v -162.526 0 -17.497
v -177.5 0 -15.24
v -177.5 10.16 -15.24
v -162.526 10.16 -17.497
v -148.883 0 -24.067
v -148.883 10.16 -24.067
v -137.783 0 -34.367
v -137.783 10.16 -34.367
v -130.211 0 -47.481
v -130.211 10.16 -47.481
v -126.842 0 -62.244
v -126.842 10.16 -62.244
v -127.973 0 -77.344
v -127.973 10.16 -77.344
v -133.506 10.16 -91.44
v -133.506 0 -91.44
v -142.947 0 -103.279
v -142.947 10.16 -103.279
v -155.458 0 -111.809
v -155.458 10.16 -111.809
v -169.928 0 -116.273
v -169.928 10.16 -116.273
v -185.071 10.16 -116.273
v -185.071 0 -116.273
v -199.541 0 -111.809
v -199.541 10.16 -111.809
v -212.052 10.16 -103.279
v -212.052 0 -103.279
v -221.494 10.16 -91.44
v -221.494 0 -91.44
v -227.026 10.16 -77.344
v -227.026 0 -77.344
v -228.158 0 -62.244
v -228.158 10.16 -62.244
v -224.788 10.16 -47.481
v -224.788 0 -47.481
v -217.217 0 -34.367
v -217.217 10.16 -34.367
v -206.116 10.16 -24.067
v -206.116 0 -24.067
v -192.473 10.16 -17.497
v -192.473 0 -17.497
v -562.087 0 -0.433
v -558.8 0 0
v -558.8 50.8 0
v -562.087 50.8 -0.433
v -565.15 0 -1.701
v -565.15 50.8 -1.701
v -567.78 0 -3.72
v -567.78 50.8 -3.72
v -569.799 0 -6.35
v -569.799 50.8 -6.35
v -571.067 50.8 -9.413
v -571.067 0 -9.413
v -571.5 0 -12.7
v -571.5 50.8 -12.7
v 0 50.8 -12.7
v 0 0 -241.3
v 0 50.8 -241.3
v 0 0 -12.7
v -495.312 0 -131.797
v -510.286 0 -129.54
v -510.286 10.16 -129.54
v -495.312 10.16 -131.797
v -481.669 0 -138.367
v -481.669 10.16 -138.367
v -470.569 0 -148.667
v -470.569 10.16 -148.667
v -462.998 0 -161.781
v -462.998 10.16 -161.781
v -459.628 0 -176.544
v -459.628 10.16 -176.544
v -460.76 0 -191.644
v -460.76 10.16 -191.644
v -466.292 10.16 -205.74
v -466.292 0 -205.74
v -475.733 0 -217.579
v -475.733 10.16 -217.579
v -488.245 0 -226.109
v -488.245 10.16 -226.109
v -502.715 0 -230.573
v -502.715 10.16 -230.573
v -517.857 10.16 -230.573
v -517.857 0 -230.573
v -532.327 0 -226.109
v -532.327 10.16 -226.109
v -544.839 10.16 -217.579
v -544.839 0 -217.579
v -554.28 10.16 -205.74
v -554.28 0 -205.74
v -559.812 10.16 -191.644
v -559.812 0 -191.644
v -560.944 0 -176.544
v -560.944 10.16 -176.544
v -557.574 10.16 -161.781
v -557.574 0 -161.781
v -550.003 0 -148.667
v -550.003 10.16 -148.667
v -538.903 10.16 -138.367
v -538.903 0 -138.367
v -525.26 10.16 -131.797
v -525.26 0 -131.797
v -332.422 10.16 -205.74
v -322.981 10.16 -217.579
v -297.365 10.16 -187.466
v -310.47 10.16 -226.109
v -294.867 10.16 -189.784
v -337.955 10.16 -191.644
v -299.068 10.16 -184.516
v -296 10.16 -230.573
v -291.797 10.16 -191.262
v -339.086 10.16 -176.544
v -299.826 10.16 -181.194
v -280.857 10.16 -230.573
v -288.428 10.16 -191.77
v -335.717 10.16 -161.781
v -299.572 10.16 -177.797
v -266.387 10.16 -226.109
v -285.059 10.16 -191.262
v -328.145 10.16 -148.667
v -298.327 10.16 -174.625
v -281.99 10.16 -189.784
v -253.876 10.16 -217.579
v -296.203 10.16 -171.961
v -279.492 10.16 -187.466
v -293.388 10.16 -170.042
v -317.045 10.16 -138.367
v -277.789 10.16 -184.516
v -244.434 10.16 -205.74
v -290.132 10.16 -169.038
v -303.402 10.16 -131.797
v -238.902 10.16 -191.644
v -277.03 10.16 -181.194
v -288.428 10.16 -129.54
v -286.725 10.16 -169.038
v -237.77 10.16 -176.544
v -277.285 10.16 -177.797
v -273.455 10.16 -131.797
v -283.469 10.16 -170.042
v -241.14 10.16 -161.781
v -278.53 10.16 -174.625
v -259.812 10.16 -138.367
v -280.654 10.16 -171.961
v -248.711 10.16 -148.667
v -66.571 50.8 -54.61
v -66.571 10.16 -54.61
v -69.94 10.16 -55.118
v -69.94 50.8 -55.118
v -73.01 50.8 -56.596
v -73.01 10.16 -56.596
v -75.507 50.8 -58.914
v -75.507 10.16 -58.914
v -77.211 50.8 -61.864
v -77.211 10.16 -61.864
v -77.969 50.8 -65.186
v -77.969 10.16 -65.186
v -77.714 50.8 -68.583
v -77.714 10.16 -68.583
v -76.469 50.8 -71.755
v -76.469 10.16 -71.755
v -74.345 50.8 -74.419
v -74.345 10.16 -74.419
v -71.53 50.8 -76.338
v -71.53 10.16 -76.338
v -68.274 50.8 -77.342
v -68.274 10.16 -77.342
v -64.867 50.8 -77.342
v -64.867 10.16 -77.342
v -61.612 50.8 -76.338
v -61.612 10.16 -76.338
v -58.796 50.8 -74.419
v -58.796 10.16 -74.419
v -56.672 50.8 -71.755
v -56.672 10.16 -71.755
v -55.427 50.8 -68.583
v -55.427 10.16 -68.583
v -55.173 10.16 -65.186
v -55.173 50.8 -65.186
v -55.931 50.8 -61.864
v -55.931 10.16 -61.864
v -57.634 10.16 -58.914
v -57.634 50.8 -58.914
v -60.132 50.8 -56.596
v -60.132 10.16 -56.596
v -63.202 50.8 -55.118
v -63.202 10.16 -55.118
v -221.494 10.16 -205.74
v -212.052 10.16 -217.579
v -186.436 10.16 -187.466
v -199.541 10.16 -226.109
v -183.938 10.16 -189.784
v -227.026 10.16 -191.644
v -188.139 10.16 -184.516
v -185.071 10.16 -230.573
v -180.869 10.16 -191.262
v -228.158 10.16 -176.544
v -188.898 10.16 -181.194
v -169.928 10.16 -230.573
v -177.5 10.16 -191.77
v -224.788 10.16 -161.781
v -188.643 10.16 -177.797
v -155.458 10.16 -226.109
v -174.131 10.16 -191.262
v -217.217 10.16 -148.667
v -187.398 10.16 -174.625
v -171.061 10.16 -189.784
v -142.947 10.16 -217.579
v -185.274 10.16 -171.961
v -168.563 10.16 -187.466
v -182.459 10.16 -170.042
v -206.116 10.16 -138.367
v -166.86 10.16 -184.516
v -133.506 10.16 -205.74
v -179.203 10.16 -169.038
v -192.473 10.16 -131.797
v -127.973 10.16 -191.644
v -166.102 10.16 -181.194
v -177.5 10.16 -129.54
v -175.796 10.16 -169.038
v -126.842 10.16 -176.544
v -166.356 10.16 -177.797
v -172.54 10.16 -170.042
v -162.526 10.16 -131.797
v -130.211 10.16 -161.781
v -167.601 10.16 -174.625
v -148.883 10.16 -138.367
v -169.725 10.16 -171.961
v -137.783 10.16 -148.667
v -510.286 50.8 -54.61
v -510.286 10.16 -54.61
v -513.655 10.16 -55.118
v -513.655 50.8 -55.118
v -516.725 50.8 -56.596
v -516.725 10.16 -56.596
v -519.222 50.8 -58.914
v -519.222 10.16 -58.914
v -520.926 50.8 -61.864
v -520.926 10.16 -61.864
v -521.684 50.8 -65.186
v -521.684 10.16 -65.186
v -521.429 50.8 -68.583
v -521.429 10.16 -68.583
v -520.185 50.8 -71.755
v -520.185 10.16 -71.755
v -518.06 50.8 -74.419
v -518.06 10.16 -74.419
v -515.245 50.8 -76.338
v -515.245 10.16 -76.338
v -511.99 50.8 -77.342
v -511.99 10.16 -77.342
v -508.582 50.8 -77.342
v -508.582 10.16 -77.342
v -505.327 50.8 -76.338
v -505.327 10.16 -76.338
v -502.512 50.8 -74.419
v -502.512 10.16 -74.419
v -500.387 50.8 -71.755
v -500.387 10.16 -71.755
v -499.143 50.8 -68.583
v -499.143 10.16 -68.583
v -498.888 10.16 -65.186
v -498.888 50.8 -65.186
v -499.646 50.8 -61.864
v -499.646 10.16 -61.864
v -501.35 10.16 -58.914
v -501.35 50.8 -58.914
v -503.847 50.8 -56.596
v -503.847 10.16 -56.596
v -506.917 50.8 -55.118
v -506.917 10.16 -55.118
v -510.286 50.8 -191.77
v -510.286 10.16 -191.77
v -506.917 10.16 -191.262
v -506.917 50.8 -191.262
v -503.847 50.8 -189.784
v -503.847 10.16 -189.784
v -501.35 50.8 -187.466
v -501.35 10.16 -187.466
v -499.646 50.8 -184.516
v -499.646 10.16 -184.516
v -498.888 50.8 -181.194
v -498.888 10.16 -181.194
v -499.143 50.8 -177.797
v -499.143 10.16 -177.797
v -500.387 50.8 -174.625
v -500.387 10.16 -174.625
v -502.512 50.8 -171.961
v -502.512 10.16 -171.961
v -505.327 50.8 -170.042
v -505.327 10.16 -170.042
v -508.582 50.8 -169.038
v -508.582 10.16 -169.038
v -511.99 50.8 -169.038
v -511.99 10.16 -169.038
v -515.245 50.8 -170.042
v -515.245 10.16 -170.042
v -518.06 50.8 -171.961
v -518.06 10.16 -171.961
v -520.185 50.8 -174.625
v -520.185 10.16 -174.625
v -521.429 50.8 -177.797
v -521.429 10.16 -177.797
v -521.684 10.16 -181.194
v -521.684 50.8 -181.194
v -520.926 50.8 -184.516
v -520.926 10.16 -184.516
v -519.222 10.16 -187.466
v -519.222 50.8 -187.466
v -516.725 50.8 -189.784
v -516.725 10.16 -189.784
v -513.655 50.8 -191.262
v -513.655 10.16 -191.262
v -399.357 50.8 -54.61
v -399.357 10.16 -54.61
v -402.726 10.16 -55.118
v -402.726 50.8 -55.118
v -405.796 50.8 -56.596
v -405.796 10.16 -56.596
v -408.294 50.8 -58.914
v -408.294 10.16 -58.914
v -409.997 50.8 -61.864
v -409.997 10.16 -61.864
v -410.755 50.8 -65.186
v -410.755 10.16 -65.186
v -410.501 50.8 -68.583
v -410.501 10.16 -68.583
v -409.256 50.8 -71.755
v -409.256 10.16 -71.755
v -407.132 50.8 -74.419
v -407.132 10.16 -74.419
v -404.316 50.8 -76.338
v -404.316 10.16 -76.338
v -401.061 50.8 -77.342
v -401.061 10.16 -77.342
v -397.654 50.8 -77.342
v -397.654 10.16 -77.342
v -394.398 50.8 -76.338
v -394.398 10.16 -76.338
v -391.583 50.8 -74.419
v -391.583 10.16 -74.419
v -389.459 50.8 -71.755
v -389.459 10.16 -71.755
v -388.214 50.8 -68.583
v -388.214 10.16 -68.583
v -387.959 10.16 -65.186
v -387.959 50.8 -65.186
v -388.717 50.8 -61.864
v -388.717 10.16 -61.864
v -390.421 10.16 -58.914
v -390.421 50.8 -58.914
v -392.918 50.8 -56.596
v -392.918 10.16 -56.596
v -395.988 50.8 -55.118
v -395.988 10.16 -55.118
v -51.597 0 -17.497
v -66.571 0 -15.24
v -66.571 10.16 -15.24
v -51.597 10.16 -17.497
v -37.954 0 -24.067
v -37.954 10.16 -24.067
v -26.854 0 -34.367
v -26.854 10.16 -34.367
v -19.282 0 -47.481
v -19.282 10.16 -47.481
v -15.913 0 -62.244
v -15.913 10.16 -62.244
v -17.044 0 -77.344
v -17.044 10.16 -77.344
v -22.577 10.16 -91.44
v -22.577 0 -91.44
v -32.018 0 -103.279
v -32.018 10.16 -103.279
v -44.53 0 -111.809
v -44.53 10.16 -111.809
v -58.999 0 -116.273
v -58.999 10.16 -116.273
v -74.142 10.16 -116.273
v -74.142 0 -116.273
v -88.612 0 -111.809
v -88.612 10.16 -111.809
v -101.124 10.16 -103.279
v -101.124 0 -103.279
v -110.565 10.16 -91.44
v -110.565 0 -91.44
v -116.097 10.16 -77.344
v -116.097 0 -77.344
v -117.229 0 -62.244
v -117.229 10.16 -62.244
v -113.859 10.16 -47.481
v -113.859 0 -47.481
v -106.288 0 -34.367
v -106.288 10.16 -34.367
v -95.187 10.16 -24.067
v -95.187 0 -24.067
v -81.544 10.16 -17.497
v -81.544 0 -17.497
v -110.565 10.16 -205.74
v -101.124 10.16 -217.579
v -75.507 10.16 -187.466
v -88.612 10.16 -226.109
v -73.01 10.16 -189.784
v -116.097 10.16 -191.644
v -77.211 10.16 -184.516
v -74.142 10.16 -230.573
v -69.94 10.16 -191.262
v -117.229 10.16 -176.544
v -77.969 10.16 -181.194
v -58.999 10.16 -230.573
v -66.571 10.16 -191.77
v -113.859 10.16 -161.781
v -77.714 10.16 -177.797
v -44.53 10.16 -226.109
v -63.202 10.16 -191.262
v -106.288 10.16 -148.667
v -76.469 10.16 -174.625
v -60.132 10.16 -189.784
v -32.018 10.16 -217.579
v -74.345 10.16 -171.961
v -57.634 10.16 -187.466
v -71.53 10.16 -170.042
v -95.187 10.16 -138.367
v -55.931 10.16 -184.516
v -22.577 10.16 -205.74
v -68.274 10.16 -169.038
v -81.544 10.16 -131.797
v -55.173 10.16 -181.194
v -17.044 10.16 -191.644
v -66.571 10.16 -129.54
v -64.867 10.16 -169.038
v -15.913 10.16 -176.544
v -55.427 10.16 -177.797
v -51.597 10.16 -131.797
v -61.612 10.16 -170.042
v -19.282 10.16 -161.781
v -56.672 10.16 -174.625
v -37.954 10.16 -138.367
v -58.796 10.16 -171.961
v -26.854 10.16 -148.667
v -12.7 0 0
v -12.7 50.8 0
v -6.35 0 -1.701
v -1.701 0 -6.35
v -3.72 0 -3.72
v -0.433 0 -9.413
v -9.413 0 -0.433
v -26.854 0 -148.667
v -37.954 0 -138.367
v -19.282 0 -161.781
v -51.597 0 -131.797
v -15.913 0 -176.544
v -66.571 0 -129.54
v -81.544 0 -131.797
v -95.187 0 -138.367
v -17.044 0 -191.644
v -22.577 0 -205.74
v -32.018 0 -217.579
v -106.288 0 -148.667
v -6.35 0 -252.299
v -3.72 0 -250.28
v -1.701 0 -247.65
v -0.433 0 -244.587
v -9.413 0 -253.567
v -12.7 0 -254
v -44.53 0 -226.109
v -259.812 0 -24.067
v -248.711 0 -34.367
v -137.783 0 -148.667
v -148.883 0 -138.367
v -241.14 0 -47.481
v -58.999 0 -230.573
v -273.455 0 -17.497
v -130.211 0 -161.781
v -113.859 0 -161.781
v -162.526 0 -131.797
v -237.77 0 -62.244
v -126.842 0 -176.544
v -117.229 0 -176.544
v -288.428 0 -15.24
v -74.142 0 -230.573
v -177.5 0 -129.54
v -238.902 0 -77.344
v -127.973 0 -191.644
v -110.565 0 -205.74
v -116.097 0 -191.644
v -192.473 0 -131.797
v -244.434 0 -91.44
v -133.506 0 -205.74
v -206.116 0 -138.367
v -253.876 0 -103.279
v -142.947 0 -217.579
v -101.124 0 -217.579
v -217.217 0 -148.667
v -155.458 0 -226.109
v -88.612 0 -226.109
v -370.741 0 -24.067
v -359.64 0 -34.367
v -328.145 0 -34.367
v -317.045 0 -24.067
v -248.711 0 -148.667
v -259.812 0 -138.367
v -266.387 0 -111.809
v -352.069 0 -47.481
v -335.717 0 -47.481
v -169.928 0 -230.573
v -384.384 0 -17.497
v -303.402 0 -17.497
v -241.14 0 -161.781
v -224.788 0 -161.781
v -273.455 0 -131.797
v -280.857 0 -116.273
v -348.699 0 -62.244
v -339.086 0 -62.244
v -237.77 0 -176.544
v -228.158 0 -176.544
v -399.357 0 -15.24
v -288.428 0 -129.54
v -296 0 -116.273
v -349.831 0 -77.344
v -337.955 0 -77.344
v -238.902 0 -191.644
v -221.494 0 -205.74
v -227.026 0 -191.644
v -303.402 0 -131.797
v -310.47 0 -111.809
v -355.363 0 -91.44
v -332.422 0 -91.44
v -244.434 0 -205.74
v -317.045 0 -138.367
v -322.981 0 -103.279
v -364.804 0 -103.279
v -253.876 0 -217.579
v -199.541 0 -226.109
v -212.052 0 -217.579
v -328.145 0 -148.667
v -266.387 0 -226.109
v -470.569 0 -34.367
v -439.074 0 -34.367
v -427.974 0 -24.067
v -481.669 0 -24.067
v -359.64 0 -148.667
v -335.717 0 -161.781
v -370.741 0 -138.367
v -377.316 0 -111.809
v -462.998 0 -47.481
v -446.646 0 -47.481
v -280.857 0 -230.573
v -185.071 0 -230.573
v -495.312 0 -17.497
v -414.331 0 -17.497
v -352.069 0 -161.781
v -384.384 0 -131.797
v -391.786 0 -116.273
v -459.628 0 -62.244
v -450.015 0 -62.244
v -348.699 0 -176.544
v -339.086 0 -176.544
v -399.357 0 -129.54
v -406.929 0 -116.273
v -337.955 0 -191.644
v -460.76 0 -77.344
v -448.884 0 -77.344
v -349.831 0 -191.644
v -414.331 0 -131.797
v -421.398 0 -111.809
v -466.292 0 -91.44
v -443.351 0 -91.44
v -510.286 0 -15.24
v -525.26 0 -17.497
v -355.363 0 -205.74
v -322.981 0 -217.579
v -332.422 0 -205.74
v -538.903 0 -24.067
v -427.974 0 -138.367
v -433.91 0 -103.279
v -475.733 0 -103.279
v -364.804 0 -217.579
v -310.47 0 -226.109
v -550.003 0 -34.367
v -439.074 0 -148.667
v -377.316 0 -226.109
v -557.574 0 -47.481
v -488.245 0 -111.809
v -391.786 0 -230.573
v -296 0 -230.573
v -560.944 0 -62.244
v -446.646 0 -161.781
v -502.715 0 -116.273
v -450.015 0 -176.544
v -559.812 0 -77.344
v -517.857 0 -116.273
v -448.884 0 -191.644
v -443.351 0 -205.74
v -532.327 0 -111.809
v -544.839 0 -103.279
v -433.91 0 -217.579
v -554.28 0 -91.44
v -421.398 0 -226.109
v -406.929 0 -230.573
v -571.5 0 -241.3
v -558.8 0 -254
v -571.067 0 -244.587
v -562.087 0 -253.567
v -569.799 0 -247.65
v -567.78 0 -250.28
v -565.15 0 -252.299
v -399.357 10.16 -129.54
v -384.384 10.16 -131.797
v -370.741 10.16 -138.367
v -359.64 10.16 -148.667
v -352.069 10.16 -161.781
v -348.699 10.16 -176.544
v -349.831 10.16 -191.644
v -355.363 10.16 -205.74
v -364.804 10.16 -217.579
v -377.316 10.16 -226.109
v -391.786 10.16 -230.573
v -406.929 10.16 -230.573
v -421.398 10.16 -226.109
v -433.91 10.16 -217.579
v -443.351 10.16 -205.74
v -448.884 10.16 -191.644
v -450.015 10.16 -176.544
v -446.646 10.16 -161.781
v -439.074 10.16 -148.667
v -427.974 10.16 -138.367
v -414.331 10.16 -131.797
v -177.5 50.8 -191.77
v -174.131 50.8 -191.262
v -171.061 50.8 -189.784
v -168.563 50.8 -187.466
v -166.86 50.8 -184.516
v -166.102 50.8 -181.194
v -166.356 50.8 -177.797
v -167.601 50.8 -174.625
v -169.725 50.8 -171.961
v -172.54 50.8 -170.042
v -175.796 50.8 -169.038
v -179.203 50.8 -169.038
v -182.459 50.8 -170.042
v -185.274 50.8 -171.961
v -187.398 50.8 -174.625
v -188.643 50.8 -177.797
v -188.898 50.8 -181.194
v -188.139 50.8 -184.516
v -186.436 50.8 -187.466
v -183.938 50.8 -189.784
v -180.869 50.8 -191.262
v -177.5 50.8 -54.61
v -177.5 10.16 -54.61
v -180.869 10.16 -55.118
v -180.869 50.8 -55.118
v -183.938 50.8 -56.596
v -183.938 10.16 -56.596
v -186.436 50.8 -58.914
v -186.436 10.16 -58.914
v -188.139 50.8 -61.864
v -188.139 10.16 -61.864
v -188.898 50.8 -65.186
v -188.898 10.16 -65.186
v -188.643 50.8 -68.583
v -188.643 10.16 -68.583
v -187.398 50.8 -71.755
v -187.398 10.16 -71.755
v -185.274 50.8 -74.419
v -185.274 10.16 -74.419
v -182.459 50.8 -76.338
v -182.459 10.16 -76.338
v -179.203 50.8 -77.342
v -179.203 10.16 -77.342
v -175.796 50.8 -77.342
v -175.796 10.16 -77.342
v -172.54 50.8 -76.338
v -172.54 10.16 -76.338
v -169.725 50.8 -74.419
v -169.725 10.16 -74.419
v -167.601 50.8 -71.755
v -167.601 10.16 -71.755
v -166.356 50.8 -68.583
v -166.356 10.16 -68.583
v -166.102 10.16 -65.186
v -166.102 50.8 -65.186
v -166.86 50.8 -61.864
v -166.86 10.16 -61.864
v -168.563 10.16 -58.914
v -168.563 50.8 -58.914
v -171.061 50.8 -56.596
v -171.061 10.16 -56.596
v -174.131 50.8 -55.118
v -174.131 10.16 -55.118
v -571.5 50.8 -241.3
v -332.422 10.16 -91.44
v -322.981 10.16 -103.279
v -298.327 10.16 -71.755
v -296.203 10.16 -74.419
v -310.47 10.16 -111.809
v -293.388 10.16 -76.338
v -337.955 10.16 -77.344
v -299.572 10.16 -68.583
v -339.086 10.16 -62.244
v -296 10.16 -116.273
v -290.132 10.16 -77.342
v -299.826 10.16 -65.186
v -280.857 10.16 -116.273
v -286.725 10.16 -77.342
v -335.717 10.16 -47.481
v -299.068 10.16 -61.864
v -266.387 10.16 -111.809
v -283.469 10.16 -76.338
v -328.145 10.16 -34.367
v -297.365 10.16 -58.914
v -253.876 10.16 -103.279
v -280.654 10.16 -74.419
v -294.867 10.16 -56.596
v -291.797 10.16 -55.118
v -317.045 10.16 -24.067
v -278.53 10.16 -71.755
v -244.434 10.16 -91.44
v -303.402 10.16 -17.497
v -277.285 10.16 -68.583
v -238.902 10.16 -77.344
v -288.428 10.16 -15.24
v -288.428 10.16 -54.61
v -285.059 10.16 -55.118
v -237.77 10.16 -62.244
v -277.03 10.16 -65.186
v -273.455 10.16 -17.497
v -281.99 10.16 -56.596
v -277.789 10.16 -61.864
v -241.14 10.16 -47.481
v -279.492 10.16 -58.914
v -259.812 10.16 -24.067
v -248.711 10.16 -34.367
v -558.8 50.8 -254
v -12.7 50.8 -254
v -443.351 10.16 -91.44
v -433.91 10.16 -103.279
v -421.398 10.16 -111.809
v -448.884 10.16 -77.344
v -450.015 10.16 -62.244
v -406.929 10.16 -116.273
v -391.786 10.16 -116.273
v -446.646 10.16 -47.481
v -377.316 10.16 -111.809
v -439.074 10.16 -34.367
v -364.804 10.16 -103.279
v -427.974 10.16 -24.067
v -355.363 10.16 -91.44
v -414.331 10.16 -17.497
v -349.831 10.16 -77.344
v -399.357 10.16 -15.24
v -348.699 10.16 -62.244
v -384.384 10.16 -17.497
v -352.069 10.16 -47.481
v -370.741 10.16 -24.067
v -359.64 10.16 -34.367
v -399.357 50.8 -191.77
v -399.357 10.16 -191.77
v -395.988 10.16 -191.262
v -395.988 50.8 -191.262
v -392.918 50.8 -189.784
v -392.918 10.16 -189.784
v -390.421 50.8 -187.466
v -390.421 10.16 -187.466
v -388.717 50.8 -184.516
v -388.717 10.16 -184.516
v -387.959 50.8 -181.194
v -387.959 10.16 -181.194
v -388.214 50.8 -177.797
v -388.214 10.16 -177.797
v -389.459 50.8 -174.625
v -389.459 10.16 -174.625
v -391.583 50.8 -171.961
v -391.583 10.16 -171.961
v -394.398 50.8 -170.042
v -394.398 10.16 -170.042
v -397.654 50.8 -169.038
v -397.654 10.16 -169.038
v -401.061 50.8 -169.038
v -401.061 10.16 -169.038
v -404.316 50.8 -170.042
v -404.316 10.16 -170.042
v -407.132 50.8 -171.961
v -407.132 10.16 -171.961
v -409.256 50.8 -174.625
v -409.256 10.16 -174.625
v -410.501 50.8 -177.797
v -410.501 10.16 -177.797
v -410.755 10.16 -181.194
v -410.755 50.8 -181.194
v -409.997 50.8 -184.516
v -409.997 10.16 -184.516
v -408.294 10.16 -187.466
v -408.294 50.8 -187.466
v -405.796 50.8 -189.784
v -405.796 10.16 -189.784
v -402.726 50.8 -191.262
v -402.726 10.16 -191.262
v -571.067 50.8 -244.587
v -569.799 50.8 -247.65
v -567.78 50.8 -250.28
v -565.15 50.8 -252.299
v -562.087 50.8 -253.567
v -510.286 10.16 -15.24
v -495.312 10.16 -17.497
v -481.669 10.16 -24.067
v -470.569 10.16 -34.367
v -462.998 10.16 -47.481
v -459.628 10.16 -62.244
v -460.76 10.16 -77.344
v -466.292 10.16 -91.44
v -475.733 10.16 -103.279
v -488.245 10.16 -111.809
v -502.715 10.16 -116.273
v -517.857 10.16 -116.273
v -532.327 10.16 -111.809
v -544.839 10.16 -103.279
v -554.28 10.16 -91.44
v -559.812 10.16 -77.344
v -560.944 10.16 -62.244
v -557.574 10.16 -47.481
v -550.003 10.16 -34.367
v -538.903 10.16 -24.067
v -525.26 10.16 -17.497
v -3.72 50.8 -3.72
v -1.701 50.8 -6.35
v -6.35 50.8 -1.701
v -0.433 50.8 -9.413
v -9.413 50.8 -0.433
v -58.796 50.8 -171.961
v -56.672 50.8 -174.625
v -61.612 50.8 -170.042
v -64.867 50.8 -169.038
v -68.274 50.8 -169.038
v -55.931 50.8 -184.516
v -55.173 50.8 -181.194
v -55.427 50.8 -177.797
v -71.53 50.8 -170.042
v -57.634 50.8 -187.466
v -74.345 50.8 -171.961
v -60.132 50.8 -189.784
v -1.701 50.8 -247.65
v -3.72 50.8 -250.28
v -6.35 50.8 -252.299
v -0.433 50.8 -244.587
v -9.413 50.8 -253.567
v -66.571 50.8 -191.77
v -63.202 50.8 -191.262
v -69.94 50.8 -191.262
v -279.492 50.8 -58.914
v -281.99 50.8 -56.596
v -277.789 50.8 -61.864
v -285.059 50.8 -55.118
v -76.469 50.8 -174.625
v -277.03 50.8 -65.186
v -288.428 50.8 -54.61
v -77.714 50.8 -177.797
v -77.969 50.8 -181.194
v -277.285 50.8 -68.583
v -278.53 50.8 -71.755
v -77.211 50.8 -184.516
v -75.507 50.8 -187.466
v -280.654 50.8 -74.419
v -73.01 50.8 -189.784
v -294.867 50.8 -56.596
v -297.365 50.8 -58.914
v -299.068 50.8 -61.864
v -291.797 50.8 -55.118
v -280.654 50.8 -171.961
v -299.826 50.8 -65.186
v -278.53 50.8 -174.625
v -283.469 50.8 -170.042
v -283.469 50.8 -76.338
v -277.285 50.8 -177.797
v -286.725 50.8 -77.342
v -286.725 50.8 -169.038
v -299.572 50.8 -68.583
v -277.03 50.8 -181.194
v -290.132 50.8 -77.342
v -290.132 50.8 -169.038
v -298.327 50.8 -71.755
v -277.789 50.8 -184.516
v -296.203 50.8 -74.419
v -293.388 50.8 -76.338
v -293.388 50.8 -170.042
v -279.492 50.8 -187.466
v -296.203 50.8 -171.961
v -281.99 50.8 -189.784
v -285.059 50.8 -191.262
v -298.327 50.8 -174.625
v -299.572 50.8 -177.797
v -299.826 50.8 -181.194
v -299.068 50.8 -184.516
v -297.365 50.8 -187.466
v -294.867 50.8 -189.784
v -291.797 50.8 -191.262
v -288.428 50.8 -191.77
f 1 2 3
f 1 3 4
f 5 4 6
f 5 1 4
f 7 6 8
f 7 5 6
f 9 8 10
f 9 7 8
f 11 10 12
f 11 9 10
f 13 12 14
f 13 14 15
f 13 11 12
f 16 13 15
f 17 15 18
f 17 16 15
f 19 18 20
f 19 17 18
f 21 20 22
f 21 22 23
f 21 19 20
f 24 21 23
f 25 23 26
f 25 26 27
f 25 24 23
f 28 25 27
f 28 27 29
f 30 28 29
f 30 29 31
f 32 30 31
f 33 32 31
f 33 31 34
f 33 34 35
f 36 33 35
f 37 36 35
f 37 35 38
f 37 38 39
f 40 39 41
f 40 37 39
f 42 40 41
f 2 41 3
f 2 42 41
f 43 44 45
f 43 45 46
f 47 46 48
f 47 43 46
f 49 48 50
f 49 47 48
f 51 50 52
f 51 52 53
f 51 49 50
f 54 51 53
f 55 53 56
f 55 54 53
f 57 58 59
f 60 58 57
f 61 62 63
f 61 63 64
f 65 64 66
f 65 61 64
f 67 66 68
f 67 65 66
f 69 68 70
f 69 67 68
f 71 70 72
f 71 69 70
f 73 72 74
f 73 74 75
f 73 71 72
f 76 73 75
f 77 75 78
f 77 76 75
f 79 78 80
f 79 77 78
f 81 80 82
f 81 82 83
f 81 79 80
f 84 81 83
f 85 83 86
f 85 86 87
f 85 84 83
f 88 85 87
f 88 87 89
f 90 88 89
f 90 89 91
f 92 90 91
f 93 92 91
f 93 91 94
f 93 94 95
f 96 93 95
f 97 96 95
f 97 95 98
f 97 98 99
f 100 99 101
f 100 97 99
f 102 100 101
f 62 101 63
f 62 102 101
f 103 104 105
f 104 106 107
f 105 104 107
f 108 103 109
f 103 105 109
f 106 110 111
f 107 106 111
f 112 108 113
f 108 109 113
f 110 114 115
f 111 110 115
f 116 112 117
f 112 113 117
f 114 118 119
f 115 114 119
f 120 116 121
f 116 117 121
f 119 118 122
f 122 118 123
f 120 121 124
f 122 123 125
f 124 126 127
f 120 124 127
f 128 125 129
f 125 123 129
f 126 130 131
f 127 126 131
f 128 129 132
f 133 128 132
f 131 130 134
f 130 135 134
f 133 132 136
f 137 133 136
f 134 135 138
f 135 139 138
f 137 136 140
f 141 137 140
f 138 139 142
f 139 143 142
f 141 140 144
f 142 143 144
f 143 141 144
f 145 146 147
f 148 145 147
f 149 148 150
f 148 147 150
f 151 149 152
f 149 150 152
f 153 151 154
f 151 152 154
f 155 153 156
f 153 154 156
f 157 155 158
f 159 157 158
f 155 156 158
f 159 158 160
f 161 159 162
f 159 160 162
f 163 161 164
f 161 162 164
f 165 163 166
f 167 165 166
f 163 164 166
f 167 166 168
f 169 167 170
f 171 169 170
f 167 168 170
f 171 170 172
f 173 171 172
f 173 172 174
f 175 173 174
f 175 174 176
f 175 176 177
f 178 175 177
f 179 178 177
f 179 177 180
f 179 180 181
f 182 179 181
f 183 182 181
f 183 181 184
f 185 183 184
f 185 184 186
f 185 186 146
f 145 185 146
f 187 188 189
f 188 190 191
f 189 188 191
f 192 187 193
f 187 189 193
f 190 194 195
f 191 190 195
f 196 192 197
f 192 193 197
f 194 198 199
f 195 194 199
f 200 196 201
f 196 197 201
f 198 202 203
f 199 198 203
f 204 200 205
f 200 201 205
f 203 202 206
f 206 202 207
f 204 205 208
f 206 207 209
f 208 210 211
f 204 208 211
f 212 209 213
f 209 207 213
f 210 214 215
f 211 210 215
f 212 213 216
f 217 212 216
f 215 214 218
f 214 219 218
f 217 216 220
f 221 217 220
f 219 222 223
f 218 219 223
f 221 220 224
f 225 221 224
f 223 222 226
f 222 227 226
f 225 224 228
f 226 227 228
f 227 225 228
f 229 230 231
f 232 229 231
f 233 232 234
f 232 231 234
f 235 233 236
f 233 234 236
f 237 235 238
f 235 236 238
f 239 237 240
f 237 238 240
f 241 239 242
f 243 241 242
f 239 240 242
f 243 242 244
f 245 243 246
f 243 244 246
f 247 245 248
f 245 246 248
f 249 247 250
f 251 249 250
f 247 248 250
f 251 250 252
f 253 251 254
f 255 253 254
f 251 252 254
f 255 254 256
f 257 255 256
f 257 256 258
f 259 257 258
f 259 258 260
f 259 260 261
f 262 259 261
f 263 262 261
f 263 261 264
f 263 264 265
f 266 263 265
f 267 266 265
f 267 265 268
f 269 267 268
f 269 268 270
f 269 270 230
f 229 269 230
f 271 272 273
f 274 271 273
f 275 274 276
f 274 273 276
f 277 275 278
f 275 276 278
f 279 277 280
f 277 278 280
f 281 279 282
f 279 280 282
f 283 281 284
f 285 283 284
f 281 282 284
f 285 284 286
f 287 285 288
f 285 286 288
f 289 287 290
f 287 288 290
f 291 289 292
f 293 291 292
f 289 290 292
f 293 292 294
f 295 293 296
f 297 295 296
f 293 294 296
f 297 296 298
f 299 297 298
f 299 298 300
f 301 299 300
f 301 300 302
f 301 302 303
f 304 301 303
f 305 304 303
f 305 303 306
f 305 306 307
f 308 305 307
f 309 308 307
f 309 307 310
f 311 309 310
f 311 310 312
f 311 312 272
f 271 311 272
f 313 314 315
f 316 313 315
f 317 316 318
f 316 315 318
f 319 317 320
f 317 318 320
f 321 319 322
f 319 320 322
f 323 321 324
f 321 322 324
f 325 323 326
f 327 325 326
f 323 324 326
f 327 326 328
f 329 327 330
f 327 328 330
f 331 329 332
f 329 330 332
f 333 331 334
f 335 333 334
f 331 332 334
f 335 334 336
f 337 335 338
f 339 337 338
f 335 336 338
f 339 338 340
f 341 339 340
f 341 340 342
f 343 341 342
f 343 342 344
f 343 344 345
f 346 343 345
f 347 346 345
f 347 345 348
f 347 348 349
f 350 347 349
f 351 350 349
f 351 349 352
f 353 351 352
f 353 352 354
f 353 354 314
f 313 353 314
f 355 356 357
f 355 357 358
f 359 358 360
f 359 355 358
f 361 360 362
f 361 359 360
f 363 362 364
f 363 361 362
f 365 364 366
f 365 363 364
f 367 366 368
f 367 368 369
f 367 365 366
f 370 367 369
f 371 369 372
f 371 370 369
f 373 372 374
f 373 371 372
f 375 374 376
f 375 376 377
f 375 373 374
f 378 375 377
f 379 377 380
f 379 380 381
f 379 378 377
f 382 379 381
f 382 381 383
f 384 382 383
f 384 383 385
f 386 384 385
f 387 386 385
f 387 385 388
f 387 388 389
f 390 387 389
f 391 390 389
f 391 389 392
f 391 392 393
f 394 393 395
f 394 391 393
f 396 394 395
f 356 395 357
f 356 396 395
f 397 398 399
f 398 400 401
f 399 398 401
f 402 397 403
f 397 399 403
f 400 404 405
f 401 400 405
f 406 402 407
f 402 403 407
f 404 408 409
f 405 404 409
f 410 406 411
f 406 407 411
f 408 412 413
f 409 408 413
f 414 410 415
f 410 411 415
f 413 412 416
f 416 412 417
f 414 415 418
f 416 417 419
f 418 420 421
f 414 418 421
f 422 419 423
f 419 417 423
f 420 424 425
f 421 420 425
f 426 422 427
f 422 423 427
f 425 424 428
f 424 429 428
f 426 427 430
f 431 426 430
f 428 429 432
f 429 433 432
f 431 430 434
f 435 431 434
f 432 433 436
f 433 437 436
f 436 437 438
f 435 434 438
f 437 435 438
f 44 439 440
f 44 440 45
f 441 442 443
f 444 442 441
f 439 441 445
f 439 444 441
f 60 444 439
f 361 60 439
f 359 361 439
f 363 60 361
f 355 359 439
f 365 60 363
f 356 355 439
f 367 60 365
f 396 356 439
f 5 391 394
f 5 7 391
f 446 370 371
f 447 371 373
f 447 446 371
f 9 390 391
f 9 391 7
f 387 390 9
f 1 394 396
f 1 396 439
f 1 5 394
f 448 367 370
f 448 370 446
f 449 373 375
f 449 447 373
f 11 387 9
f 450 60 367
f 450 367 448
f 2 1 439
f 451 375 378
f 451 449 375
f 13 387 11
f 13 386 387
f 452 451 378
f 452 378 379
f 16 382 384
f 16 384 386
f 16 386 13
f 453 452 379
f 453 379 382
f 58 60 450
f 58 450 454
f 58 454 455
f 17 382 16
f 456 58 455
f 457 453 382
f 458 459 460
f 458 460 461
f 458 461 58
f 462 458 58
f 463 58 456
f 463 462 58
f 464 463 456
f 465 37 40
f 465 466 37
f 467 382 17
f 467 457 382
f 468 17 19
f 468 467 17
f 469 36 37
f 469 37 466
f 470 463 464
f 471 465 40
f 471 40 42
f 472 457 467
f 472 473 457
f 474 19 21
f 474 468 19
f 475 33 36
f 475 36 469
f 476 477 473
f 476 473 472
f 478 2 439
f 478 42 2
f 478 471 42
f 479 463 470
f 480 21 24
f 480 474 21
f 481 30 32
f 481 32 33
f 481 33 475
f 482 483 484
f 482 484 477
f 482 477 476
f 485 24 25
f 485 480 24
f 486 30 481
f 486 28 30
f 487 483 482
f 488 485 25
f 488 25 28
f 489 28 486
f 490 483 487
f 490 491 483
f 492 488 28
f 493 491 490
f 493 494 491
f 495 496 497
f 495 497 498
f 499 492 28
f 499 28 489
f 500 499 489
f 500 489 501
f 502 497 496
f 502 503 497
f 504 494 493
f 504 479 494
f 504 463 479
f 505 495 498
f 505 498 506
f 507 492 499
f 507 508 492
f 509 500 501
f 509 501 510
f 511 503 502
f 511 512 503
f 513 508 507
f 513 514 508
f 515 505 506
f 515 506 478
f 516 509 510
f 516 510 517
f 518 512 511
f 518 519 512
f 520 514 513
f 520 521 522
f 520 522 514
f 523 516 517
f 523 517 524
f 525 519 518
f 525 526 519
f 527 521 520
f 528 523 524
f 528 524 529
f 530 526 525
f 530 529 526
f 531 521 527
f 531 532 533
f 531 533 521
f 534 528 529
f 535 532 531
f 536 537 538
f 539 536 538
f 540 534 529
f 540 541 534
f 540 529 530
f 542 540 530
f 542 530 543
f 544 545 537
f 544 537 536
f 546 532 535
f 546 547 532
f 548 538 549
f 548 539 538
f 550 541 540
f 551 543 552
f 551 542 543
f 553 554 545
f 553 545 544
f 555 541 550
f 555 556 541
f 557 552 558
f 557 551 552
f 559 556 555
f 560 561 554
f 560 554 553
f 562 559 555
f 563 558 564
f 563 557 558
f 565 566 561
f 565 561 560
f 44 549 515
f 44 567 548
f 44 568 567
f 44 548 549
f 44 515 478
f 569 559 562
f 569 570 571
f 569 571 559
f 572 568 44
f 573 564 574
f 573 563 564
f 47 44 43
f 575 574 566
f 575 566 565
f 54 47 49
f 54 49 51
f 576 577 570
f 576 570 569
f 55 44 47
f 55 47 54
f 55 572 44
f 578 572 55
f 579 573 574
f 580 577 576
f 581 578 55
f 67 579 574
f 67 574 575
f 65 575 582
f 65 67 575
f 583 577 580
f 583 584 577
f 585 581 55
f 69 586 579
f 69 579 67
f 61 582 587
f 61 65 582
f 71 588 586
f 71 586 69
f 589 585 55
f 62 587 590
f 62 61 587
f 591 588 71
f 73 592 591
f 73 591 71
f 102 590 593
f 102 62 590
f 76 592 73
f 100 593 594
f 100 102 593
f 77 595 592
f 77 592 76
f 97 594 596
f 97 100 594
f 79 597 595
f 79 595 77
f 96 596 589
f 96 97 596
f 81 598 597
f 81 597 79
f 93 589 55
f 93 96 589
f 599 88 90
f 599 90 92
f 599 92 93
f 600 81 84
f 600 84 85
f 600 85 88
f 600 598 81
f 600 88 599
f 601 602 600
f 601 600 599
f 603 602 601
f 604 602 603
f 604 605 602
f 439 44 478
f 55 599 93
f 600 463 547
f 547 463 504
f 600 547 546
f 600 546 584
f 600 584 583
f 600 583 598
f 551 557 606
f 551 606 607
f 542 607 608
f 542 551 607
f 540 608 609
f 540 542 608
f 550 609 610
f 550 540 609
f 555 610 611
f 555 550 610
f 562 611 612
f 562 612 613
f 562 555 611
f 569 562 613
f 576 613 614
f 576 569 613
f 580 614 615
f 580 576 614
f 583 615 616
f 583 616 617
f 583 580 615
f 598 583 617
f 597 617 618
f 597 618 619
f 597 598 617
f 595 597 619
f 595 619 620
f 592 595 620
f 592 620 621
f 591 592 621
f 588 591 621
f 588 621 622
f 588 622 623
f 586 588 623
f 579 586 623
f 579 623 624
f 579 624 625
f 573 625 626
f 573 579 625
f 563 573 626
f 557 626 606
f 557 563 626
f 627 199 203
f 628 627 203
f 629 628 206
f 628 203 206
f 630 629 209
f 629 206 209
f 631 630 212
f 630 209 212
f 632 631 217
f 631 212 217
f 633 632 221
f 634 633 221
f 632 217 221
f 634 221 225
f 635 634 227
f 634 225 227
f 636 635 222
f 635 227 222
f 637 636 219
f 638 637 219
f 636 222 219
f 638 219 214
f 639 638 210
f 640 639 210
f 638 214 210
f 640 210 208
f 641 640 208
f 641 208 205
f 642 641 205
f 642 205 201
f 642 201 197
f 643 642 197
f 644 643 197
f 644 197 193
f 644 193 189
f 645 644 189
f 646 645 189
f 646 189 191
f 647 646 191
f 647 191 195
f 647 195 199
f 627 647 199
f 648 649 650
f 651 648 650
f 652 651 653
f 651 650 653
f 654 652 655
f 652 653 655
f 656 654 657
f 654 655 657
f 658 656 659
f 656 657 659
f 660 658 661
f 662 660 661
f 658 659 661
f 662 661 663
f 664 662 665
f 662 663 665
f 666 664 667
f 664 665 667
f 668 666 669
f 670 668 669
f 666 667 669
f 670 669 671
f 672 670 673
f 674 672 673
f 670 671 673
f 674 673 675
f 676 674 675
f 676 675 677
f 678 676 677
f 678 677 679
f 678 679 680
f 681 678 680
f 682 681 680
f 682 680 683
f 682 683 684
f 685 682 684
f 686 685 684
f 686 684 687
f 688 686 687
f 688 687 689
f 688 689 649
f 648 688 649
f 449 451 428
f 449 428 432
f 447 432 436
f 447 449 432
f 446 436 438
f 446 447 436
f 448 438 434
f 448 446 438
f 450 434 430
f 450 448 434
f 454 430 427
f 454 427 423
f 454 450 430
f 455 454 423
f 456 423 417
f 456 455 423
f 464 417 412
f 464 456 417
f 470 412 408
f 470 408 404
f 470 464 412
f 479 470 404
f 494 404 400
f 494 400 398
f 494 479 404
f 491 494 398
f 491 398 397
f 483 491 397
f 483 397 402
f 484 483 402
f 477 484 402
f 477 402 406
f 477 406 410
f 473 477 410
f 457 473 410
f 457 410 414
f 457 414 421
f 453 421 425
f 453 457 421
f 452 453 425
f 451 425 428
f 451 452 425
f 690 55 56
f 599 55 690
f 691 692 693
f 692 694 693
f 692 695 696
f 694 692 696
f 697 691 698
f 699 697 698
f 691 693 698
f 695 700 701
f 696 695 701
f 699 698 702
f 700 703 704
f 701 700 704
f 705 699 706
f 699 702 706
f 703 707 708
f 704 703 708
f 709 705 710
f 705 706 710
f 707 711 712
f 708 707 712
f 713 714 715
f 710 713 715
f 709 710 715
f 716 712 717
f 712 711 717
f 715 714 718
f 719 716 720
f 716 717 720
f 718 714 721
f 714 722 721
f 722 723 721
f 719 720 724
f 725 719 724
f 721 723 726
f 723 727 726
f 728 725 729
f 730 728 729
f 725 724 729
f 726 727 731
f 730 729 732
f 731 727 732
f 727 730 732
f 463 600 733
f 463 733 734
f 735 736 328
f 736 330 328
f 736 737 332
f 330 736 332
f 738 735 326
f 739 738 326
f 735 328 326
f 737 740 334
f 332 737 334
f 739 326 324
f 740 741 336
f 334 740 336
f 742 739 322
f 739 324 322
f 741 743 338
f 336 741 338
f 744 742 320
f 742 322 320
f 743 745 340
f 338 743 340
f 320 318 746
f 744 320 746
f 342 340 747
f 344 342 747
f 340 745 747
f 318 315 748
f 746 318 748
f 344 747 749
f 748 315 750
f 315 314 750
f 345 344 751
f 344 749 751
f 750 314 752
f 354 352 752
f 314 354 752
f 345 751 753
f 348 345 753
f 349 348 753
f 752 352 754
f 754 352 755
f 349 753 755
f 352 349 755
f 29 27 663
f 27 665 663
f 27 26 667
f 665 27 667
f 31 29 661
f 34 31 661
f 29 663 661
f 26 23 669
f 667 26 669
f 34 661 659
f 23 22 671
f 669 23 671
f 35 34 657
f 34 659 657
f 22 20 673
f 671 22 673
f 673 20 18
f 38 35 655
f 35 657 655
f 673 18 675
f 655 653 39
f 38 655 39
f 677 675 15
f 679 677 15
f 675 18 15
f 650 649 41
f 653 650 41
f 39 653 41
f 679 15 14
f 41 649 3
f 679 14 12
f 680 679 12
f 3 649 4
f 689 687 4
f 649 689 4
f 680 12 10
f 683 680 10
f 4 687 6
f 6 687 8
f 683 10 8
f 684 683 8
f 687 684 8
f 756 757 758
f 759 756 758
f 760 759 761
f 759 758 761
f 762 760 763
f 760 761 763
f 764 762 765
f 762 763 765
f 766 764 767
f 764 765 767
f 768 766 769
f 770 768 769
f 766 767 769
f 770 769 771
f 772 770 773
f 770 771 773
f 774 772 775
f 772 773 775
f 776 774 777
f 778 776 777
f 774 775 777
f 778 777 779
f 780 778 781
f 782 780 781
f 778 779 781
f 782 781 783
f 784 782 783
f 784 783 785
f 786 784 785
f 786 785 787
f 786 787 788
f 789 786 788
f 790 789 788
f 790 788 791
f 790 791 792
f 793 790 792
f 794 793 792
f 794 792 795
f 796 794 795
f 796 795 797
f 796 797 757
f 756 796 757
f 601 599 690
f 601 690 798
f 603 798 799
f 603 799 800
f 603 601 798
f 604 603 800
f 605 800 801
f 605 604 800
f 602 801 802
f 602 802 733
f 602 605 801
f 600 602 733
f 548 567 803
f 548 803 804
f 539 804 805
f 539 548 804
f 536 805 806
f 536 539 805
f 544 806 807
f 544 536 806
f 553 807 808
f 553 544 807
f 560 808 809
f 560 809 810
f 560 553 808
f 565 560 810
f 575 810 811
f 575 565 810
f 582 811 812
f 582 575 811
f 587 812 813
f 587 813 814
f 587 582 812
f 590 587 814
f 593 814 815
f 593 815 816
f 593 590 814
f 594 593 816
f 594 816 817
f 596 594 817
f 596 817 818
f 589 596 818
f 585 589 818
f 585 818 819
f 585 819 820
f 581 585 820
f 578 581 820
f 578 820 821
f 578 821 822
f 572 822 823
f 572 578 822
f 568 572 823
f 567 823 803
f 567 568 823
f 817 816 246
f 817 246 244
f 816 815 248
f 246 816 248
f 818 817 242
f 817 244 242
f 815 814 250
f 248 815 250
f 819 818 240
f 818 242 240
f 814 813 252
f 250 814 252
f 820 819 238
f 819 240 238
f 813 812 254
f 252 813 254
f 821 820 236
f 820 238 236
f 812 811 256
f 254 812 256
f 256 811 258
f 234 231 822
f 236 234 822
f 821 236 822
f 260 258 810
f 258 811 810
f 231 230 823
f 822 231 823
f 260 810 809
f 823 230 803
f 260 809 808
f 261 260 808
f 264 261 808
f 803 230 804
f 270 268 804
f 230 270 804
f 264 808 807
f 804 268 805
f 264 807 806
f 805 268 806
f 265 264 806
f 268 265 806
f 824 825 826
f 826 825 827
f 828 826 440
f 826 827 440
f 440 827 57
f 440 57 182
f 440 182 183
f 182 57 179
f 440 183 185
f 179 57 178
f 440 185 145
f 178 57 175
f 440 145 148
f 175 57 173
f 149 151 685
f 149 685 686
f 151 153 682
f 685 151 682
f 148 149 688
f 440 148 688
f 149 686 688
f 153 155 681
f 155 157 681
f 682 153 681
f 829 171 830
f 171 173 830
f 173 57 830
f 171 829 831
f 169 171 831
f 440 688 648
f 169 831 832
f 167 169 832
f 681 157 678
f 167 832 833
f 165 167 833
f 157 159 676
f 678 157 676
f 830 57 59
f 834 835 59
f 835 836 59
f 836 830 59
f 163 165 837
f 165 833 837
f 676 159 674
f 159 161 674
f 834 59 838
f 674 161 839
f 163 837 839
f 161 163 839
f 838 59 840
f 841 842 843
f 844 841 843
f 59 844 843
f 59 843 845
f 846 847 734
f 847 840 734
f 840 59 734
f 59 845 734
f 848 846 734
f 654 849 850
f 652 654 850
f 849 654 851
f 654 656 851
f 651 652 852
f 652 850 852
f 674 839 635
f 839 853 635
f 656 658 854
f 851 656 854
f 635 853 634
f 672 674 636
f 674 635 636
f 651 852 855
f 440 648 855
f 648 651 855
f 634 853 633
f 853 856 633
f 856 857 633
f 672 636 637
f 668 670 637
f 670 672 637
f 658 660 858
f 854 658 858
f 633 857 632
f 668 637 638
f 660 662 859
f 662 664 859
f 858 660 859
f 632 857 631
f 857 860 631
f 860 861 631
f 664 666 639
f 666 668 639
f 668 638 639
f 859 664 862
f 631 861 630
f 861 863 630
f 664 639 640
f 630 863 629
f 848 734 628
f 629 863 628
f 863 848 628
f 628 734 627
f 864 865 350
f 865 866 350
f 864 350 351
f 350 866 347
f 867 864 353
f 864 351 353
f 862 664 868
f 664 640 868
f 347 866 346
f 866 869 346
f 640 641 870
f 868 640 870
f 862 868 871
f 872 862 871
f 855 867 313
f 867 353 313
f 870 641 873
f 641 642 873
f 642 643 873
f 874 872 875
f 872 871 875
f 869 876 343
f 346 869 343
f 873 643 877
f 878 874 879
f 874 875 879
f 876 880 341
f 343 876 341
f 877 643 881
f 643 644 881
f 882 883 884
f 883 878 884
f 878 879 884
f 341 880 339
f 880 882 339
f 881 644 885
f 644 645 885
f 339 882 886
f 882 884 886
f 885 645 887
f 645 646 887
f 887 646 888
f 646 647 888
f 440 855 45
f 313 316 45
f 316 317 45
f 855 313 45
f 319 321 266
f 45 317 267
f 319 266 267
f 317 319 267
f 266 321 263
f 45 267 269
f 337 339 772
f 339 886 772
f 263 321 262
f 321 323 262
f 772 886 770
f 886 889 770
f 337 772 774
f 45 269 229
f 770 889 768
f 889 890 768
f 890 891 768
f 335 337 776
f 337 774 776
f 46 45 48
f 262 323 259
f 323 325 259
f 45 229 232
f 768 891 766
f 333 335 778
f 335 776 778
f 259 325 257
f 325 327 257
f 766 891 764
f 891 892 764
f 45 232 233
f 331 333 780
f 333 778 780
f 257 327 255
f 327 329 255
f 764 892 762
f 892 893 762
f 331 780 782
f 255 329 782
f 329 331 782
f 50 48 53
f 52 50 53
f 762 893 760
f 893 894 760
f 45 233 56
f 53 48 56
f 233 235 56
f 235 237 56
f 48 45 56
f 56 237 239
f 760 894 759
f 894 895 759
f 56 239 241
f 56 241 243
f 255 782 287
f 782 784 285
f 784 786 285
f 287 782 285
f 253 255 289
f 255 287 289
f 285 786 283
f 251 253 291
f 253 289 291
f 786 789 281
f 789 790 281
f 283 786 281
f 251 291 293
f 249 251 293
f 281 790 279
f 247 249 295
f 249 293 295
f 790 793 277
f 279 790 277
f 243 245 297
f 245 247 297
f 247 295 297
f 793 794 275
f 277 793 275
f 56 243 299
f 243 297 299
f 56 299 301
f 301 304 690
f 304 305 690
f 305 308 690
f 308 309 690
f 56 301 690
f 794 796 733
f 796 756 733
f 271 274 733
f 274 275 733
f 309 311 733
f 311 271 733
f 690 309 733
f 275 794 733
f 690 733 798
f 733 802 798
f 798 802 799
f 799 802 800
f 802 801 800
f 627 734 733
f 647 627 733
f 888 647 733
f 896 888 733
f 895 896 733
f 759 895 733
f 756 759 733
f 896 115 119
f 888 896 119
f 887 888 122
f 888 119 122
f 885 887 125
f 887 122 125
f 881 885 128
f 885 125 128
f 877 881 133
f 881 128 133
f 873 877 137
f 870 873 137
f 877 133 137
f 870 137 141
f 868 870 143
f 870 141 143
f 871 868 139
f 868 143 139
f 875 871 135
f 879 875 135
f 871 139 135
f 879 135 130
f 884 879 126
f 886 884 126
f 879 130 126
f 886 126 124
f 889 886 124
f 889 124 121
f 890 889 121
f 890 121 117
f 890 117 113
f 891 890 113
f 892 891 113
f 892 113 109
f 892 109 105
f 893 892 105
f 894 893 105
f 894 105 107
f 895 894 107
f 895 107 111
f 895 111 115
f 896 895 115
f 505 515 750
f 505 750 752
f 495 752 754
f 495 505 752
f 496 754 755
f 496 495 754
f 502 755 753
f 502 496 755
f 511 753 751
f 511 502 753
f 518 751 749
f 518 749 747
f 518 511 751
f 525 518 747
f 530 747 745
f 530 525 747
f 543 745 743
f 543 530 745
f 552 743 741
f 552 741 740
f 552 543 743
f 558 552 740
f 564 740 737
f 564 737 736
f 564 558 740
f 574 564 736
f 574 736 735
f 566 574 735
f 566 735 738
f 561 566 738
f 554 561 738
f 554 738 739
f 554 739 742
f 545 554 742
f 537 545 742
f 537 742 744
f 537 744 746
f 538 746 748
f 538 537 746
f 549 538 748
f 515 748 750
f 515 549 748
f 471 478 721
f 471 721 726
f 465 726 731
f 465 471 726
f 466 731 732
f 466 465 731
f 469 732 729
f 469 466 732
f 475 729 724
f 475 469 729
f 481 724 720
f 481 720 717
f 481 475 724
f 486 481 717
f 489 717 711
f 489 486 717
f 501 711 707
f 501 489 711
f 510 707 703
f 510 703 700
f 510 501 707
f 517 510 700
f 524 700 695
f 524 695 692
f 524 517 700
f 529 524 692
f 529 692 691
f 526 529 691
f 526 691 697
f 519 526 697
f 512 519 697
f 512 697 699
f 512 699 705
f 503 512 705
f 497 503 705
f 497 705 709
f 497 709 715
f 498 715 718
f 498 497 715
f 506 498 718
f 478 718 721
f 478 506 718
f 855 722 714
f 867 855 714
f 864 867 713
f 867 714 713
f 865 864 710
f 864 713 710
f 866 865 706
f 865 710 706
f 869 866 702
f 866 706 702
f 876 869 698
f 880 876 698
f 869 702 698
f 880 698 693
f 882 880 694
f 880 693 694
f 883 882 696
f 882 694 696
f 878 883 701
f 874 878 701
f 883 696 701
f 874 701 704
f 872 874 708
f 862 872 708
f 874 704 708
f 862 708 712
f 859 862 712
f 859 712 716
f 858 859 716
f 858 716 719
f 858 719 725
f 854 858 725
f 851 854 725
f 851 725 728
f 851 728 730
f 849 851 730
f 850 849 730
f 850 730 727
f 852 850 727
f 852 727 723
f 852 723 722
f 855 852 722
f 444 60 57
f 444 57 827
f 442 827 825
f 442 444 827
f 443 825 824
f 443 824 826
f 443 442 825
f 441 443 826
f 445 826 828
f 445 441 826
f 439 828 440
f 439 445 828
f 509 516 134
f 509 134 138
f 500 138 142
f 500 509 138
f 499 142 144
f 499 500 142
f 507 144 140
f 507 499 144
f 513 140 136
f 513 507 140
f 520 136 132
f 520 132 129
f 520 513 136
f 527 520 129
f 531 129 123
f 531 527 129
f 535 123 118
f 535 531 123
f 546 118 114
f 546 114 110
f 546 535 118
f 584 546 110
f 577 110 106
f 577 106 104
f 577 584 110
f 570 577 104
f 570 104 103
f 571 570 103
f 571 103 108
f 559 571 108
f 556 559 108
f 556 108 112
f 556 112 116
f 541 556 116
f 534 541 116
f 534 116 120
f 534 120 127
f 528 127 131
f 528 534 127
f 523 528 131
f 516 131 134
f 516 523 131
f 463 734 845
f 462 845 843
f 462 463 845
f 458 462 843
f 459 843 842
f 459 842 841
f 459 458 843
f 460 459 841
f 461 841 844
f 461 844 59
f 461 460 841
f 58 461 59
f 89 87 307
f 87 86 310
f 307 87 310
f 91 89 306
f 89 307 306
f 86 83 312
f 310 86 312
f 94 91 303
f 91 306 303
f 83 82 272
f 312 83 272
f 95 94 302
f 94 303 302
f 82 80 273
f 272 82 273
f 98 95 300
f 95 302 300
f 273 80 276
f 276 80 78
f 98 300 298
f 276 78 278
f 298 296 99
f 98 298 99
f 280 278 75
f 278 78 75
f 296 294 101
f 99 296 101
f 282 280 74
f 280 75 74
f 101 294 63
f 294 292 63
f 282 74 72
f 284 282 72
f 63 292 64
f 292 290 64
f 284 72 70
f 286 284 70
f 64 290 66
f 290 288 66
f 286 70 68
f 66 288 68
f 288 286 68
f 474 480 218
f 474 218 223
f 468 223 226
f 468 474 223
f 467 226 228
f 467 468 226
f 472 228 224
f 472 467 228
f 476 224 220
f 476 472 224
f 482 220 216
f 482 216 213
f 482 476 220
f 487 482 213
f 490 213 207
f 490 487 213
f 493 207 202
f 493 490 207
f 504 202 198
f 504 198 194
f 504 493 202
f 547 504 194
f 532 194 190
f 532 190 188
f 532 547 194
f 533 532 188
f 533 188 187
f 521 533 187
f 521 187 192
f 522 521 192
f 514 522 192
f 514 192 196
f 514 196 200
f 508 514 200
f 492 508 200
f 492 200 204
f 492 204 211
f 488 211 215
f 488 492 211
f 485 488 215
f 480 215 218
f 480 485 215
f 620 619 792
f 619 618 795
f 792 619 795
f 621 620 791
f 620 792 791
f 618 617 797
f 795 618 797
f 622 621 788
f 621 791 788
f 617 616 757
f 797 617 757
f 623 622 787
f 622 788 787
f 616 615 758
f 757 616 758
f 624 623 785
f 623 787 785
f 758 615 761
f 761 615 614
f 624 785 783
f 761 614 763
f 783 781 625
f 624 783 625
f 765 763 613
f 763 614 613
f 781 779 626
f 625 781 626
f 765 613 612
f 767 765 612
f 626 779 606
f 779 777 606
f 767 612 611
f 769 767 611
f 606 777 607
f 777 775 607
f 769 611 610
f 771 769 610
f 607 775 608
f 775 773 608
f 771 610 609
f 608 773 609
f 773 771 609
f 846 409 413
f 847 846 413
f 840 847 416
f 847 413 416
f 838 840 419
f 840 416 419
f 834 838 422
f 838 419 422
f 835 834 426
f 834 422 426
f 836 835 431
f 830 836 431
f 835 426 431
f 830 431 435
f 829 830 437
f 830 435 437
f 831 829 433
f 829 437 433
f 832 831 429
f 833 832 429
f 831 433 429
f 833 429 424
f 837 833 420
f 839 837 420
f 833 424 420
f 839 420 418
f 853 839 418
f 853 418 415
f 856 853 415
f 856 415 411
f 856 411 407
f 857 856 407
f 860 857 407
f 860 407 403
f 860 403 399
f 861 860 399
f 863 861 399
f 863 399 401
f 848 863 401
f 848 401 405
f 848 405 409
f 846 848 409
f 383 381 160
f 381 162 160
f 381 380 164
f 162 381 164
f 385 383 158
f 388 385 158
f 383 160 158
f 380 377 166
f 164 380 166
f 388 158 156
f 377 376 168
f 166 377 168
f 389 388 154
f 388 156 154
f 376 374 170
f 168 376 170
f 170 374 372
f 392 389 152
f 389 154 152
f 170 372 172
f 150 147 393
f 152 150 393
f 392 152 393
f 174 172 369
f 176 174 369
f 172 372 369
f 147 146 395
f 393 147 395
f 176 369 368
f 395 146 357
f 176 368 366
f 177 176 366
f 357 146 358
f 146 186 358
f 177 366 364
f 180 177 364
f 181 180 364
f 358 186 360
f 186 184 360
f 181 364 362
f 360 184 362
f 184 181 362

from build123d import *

# Parameters (mm, degrees)
BOSS_EXTRUDE1_DEPTH = 50.8
SKETCH2_R           = 50.8
CUT_EXTRUDE1_DEPTH  = 10.16
SKETCH3_R           = 11.43
CUT_EXTRUDE2_DEPTH  = 627.721516784


with BuildPart() as part:
    # Sketch1 → Boss-Extrude1 (new body)
    with BuildSketch(Plane(origin=(0, 0, 0), x_dir=(1, 0, 0), z_dir=(0, 1, 0))):
        with BuildLine():
            Line((-12.7, 0), (-558.8, 0))
            ThreePointArc((-558.8, 0), (-567.780256121, 3.719743879), (-571.5, 12.7))
            Line((-571.5, 12.7), (-571.5, 241.3))
            ThreePointArc((-571.5, 241.3), (-567.780256121, 250.280256121), (-558.8, 254))
            Line((-558.8, 254), (-12.7, 254))
            ThreePointArc((-12.7, 254), (-3.719743879, 250.280256121), (0, 241.3))
            Line((0, 241.3), (0, 12.7))
            ThreePointArc((0, 12.7), (-3.719743879, 3.719743879), (-12.7, 0))
        make_face()
    extrude(amount=BOSS_EXTRUDE1_DEPTH)

    # Sketch2 → Cut-Extrude1 (cut)
    with BuildSketch(Plane(origin=(0, 0, 0), x_dir=(1, 0, 0), z_dir=(0, 1, 0))):
        with Locations(Location((-177.499611663, 66.04, 0), (0, 0, 270))):
            Circle(SKETCH2_R)
        with Locations(Location((-66.57081555, 66.04, 0), (0, 0, 270))):
            Circle(SKETCH2_R)
        with Locations(Location((-288.428407775, 66.04, 0), (0, 0, 270))):
            Circle(SKETCH2_R)
        with Locations(Location((-399.357203888, 66.04, 0), (0, 0, 270))):
            Circle(SKETCH2_R)
        with Locations(Location((-510.286, 66.04, 0), (0, 0, 270))):
            Circle(SKETCH2_R)
        with Locations(Location((-177.499611663, 180.34, 0), (0, 0, 270))):
            Circle(SKETCH2_R)
        with Locations(Location((-288.428407775, 180.34, 0), (0, 0, 270))):
            Circle(SKETCH2_R)
        with Locations(Location((-399.357203888, 180.34, 0), (0, 0, 270))):
            Circle(SKETCH2_R)
        with Locations(Location((-510.286, 180.34, 0), (0, 0, 270))):
            Circle(SKETCH2_R)
        with Locations(Location((-66.57081555, 180.34, 0), (0, 0, 270))):
            Circle(SKETCH2_R)
    extrude(amount=CUT_EXTRUDE1_DEPTH, mode=Mode.SUBTRACT)

    # Sketch3 → Cut-Extrude2 (cut, through all)
    with BuildSketch(Plane.XZ.offset(-10.16)):
        with Locations(Location((-66.57081555, -180.34, 0), (0, 0, 270))):
            Circle(SKETCH3_R)
        with Locations(Location((-177.499611663, -180.34, 0), (0, 0, 270))):
            Circle(SKETCH3_R)
        with Locations(Location((-288.428407775, -180.34, 0), (0, 0, 270))):
            Circle(SKETCH3_R)
        with Locations(Location((-399.357203888, -180.34, 0), (0, 0, 270))):
            Circle(SKETCH3_R)
        with Locations(Location((-510.286, -180.34, 0), (0, 0, 270))):
            Circle(SKETCH3_R)
        with Locations(Location((-510.286, -66.04, 0), (0, 0, 90))):
            Circle(SKETCH3_R)
        with Locations(Location((-399.357203888, -66.04, 0), (0, 0, 90))):
            Circle(SKETCH3_R)
        with Locations(Location((-288.428407775, -66.04, 0), (0, 0, 90))):
            Circle(SKETCH3_R)
        with Locations(Location((-177.499611663, -66.04, 0), (0, 0, 90))):
            Circle(SKETCH3_R)
        with Locations(Location((-66.57081555, -66.04, 0), (0, 0, 90))):
            Circle(SKETCH3_R)
    extrude(amount=-CUT_EXTRUDE2_DEPTH, mode=Mode.SUBTRACT)


solid = part.part
